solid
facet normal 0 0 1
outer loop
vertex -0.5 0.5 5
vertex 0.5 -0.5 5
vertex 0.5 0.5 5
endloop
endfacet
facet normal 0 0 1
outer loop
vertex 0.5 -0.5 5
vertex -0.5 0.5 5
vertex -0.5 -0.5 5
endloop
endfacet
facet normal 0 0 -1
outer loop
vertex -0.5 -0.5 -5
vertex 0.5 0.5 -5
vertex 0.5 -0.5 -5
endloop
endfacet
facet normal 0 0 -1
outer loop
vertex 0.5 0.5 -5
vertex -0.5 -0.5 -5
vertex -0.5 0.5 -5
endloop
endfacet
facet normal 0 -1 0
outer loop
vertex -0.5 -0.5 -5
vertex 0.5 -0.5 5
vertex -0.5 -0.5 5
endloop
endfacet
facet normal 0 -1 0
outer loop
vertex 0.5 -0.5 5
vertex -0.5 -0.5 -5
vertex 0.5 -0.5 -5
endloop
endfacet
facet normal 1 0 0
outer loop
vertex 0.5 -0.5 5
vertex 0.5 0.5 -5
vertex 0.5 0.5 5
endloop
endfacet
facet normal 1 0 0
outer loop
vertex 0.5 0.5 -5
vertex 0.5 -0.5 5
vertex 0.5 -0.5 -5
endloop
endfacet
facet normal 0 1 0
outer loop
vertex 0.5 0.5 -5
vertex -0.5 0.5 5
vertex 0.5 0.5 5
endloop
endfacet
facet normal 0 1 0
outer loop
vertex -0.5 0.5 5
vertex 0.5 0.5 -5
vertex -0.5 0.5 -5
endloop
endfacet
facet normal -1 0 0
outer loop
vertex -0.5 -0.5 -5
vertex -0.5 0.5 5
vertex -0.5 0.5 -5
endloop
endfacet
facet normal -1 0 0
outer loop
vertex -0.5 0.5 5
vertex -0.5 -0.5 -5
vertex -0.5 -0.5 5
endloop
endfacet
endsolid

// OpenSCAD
module bar(width, length)
{
	cube([width, width, length],center=true);
}

bar(1,10);
